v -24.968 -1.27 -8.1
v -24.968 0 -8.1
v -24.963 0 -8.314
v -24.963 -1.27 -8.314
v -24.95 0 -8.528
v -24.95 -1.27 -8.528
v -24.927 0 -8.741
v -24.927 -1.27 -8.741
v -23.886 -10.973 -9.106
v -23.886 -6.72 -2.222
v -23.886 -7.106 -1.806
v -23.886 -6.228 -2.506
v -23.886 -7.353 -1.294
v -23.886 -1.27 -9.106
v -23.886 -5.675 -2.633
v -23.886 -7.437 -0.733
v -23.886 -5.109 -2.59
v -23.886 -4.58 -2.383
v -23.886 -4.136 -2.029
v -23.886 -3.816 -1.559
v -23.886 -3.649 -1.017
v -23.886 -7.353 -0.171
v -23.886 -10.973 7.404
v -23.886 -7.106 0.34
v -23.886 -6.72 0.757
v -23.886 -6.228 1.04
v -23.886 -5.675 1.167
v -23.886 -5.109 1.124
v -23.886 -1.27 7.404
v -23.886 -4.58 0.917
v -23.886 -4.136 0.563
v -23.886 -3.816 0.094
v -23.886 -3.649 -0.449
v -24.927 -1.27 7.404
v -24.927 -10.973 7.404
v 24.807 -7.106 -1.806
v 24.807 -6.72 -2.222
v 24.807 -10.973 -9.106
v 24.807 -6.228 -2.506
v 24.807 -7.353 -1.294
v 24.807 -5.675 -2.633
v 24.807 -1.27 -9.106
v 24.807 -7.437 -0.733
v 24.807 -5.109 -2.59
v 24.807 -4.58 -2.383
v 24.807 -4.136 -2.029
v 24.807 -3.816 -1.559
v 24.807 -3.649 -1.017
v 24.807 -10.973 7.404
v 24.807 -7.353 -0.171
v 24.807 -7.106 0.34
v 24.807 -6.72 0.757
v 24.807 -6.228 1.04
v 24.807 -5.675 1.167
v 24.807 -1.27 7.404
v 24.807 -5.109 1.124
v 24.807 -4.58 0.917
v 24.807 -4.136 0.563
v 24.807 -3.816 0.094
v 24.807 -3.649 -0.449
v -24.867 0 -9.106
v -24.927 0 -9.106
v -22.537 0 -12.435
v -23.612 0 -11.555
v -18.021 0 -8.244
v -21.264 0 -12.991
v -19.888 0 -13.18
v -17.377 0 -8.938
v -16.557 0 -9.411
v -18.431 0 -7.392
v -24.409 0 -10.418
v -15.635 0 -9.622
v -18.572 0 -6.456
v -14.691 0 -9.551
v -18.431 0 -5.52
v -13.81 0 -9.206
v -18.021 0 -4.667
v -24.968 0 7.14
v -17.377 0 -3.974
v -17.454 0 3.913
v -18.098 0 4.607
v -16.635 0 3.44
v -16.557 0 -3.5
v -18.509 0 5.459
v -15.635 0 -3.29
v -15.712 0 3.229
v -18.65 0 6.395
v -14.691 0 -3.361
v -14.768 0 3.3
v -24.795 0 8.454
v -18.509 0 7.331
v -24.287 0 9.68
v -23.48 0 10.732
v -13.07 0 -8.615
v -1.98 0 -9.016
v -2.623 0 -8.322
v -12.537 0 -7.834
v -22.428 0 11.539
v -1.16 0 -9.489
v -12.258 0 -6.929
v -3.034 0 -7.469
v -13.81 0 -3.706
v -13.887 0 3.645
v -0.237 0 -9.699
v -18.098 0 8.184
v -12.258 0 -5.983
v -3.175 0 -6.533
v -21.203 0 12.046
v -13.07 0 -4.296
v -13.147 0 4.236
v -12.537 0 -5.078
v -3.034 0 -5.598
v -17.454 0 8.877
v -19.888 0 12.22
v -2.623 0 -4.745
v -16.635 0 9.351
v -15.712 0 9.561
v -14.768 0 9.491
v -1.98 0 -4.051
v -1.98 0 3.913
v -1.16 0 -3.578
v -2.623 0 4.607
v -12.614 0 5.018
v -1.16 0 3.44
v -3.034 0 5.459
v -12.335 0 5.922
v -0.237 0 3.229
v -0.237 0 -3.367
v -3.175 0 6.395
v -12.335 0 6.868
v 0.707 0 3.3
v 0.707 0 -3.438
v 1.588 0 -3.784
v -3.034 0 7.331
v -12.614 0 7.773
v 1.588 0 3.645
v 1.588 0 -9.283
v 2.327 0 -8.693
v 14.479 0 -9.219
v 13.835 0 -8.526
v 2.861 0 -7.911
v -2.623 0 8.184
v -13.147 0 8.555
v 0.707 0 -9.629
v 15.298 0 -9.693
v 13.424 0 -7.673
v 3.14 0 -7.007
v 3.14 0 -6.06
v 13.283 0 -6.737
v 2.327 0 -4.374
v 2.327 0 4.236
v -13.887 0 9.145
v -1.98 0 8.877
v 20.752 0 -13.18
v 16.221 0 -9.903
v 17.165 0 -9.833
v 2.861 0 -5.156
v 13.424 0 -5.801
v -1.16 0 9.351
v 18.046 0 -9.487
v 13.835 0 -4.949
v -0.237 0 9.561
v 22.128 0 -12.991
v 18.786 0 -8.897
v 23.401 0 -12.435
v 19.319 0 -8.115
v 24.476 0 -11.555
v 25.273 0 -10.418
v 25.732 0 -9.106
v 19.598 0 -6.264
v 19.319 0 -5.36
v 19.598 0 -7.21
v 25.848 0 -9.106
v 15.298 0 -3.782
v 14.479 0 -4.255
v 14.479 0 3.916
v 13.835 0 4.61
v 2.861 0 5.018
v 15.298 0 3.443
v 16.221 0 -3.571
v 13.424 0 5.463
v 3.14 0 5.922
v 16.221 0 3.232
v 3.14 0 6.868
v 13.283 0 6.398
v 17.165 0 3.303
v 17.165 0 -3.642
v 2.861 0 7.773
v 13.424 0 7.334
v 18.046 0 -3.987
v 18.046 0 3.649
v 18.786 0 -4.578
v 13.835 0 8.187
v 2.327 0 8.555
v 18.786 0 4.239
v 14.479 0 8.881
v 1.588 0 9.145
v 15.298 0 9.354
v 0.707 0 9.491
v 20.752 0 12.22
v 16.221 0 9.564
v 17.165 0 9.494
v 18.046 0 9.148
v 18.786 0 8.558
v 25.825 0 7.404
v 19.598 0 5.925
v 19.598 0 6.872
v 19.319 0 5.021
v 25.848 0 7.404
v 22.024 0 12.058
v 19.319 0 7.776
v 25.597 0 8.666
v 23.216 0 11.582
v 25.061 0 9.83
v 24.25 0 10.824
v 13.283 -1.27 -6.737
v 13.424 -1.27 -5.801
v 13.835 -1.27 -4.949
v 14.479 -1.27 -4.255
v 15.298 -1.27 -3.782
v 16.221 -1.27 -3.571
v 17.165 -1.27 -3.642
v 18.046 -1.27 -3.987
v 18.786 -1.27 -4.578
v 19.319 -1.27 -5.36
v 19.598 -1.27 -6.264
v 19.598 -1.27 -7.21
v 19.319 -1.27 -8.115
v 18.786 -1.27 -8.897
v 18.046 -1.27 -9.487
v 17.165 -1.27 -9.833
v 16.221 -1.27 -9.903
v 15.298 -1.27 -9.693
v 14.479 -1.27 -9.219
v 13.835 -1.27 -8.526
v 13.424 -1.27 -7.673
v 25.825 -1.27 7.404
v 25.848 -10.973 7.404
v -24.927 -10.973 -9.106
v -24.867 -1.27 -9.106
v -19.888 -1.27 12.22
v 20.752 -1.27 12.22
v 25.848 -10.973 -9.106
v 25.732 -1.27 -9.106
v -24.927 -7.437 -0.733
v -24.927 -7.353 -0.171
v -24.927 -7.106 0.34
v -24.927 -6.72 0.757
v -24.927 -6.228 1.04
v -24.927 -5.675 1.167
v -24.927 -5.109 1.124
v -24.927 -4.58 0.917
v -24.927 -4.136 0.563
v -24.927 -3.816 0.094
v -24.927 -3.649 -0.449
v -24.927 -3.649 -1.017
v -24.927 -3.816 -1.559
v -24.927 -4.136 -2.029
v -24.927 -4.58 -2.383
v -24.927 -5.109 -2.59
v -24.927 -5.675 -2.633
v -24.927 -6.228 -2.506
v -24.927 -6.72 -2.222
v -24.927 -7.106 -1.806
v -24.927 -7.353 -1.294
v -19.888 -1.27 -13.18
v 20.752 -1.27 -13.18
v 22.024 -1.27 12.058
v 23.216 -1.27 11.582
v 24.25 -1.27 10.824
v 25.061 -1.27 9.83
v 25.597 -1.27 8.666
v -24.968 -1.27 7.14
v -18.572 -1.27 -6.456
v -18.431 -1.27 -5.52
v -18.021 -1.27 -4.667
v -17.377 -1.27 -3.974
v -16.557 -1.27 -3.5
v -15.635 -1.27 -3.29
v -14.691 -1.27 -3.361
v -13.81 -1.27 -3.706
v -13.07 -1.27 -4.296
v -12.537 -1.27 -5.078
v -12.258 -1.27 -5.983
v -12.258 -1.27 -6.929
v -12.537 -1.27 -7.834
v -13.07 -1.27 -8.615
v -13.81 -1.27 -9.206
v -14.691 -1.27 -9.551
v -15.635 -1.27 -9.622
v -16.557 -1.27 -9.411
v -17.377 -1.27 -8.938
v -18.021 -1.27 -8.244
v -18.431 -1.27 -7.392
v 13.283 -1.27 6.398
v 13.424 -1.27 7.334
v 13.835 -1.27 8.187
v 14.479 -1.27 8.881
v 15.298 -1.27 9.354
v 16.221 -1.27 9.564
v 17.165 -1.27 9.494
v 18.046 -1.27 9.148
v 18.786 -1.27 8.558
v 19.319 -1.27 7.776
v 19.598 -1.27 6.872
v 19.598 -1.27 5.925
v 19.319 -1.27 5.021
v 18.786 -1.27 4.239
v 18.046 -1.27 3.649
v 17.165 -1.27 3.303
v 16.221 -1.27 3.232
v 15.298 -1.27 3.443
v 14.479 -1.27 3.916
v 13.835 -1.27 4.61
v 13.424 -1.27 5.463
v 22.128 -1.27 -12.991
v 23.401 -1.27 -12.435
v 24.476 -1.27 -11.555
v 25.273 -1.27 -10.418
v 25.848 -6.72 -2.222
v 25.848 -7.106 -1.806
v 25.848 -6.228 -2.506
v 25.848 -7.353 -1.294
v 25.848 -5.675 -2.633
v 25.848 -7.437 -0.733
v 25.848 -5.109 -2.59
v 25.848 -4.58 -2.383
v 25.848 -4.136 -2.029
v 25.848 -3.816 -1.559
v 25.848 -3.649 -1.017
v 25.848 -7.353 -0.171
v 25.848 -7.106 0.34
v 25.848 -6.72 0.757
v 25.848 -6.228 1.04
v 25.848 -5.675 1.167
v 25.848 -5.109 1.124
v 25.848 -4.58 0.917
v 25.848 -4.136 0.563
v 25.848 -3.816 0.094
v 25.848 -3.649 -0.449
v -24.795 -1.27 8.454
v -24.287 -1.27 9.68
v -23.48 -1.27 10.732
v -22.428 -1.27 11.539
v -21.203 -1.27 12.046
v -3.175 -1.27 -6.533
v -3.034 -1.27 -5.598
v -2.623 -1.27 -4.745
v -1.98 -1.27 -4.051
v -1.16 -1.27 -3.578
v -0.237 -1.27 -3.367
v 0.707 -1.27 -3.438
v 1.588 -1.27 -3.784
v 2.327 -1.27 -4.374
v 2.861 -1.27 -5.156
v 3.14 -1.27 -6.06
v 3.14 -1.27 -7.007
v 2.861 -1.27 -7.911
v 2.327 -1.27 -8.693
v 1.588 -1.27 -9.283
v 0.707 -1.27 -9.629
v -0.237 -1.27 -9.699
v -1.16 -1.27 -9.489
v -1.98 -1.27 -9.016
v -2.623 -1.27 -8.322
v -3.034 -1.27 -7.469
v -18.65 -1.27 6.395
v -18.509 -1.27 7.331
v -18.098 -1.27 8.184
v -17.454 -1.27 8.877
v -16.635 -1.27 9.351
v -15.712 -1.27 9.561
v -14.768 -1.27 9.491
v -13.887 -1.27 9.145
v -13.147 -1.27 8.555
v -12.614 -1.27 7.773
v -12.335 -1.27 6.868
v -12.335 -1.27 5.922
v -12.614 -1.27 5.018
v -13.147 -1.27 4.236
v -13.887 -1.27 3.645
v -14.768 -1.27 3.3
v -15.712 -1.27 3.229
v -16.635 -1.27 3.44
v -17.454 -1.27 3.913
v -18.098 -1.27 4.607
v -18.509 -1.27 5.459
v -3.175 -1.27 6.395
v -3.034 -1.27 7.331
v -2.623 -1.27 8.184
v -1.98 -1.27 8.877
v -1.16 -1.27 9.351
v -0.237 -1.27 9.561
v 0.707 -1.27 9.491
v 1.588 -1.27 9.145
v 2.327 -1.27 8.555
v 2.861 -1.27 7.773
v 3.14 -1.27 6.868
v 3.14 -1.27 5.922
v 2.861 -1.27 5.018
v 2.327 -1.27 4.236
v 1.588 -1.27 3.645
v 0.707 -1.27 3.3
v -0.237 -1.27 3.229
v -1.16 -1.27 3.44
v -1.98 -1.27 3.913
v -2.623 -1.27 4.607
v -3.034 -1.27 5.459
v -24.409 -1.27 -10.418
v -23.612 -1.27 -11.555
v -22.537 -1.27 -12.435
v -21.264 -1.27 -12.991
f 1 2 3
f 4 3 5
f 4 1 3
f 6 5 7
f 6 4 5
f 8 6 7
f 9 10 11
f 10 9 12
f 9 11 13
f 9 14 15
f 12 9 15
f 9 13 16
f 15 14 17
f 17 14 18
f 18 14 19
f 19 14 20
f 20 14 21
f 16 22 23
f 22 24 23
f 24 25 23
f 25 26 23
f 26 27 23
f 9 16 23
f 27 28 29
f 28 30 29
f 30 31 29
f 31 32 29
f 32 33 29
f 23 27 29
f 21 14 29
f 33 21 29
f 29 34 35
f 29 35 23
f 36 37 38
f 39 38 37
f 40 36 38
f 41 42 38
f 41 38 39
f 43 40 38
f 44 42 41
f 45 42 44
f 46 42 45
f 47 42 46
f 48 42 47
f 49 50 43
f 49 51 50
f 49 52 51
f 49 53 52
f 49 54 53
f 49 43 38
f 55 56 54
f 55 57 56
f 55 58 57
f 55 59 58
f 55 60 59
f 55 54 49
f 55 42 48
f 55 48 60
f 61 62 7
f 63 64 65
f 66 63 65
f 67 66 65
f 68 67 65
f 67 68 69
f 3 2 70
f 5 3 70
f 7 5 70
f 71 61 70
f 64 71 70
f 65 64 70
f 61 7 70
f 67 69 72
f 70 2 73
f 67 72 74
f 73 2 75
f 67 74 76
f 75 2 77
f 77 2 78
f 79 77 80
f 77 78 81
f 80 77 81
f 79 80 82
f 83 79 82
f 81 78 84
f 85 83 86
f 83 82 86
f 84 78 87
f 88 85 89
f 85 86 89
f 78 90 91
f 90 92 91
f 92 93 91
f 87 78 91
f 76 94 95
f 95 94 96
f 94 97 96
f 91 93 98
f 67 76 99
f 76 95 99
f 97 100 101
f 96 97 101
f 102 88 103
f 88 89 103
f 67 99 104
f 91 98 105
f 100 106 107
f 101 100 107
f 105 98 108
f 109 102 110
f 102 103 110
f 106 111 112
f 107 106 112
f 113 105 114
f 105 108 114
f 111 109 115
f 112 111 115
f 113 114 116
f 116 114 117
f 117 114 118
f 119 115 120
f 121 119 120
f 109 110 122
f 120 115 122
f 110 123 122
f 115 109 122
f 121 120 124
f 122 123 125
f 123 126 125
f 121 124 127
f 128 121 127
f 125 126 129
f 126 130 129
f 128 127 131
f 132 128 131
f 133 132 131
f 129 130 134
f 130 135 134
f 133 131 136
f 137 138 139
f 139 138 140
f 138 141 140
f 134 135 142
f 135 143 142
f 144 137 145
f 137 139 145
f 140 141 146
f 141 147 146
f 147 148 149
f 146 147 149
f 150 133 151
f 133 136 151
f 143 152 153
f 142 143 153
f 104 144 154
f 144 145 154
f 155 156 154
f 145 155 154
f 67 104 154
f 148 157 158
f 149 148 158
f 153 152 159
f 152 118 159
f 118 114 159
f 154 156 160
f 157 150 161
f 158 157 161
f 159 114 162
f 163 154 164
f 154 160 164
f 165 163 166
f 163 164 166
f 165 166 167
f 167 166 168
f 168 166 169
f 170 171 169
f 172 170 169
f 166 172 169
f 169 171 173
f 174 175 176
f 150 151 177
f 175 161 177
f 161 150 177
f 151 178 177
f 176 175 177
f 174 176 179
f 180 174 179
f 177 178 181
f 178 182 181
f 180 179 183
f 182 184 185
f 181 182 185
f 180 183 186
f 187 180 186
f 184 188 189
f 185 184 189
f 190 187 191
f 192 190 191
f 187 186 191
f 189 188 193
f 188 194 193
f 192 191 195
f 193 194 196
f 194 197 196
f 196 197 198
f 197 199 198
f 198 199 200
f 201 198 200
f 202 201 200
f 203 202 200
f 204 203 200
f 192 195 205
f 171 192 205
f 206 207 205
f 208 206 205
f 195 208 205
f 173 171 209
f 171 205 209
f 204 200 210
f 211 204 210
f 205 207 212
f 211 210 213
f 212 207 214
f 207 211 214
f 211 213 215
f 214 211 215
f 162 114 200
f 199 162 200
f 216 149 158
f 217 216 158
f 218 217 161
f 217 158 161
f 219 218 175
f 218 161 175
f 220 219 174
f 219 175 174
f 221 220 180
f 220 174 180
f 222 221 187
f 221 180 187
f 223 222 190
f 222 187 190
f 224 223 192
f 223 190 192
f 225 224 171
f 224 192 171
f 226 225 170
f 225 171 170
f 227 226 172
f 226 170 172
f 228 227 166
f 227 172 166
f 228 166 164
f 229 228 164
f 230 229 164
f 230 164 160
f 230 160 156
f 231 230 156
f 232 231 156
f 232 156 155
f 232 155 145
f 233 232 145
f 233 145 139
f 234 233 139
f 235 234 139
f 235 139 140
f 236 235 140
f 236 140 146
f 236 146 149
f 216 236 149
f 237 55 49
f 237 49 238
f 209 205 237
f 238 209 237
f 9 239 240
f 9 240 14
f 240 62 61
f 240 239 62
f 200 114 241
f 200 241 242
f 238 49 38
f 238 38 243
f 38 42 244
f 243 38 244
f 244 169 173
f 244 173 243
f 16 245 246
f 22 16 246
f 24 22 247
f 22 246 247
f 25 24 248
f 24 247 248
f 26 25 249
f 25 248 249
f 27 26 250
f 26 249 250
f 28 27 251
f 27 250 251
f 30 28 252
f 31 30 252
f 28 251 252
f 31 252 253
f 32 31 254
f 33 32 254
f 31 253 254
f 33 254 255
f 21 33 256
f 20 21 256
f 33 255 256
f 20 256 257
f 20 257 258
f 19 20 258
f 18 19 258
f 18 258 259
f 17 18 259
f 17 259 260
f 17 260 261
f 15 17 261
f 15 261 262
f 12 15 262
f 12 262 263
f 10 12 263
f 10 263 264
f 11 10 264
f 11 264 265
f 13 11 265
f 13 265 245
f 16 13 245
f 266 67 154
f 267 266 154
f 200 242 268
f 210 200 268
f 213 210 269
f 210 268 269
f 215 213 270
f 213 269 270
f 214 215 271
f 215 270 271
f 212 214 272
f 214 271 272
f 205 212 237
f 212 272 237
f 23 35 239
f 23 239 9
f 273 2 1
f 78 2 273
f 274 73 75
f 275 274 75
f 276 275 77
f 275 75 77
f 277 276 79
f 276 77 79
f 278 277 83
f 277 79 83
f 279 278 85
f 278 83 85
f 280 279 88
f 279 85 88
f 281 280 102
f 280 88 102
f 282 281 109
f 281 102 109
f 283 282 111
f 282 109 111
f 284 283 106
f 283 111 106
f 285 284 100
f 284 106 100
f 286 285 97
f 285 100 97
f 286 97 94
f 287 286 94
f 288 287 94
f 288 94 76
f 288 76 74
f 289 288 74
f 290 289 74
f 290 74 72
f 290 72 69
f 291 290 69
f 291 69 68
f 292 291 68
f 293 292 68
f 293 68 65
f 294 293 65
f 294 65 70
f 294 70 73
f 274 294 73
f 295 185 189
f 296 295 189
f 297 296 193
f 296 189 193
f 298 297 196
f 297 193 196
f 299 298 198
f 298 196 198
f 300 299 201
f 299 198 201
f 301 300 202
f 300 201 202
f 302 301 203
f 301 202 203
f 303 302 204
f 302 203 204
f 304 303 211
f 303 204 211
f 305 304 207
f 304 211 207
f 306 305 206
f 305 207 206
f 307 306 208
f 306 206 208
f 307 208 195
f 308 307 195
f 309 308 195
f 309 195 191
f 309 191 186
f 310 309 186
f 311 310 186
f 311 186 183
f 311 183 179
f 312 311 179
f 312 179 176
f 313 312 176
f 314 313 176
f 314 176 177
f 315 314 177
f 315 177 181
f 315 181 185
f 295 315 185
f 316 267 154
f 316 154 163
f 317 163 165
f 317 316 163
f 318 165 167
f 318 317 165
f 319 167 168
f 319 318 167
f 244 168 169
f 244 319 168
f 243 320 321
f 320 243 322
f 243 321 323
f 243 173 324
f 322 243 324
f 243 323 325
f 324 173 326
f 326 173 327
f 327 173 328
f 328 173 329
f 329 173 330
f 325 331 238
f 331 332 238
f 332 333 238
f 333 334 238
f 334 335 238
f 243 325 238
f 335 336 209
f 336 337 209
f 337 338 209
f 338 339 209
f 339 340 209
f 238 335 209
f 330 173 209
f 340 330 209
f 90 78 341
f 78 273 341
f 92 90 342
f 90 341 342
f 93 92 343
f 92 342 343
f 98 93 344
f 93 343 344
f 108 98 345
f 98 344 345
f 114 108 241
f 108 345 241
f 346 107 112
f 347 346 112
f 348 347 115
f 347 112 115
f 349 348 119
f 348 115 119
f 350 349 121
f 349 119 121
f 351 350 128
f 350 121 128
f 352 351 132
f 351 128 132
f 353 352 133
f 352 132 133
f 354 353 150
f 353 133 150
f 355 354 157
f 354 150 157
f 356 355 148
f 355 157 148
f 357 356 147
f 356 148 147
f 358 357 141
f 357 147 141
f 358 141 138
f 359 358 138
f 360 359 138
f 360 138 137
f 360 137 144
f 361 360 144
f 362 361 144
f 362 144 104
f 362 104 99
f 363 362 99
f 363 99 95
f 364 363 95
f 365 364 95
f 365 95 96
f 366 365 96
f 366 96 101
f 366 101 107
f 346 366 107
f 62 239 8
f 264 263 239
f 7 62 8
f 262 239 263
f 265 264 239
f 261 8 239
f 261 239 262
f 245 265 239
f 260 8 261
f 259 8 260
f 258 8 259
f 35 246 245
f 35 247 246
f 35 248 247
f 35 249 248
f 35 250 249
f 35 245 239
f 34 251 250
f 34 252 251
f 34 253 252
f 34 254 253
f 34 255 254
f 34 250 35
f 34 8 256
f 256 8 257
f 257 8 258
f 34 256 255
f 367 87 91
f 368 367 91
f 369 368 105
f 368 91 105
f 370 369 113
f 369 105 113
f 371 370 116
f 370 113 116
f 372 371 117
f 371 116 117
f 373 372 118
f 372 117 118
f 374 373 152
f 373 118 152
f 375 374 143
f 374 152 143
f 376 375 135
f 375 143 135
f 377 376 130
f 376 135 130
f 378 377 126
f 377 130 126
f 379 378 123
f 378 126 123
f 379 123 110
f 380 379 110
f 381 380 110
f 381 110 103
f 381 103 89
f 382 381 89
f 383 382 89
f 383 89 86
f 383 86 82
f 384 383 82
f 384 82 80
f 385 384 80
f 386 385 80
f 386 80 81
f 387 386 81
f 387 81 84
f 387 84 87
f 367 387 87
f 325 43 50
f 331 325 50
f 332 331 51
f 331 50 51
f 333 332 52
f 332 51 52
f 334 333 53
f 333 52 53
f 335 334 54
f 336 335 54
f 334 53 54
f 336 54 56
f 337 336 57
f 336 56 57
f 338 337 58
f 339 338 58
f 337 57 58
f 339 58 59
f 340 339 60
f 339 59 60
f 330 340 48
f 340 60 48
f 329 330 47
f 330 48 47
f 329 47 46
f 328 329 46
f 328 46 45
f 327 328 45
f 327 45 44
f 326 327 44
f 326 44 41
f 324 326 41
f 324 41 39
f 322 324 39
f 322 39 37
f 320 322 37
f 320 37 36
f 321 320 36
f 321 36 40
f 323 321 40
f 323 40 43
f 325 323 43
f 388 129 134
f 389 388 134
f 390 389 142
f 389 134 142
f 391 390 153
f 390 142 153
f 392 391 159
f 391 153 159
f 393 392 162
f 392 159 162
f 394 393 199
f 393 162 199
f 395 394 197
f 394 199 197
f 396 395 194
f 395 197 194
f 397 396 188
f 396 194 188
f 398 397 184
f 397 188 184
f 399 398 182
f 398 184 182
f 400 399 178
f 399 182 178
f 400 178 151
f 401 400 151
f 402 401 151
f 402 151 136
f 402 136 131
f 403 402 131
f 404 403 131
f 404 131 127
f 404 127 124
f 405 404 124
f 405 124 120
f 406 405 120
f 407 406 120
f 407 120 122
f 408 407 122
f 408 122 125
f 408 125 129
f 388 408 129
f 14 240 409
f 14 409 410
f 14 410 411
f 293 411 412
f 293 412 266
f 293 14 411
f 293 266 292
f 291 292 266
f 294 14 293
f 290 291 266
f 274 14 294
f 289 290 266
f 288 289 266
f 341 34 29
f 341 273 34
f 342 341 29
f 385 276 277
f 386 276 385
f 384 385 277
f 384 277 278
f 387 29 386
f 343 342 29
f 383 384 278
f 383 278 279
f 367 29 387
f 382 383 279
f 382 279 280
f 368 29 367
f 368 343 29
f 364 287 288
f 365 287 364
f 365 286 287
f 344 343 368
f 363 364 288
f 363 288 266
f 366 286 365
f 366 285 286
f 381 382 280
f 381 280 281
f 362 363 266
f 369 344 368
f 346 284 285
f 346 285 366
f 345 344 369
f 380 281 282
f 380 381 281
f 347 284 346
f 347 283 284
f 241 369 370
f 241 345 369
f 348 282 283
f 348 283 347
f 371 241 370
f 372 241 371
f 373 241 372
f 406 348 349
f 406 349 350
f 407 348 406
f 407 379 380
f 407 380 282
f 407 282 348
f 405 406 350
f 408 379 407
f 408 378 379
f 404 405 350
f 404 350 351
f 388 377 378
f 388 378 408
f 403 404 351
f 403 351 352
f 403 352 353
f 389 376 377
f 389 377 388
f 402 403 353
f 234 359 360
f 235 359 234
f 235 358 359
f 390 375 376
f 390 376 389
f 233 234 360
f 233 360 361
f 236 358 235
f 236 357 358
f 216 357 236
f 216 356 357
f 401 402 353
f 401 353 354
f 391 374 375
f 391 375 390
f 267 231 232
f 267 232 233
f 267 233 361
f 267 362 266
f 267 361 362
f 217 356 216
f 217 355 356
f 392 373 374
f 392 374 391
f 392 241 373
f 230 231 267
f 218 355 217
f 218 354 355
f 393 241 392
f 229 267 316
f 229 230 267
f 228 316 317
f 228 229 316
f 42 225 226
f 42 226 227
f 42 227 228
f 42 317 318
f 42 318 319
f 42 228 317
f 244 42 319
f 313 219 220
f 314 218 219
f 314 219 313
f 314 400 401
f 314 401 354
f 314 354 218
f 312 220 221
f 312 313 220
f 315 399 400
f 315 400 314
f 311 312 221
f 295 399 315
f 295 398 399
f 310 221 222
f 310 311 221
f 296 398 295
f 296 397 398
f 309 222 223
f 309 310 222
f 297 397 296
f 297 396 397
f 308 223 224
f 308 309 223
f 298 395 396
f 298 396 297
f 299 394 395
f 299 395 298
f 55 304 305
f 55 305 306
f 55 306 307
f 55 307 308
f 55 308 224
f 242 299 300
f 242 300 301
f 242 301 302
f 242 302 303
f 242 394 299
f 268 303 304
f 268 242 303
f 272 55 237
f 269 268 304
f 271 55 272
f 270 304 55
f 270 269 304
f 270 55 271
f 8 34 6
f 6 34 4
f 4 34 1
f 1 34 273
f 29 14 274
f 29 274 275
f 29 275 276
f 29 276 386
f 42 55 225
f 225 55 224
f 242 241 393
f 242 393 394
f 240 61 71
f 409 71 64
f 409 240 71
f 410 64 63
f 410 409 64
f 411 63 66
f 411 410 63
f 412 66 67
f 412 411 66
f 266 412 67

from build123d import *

# Parameters (mm, degrees)
F0_W     = 50.8
F0_H     = 25.4
F1_DEPTH = 1.27
F3_D     = 6.35
F4_R     = 5.08
F5_W     = 1.0414
F5_H     = 16.51
F6_DEPTH = 10.9728
F7_DEPTH = 0.254
F9_D     = 3.81


with BuildPart() as f1:
    # F0 (on Front) → F1 (new body)
    with BuildSketch(Plane.XZ):
        with Locations((0.432136, -0.480445)):
            Rectangle(F0_W, F0_H)
    extrude(amount=F1_DEPTH)

    # F3 (through all)
    with Locations(Plane.XZ.offset(1.27)):
        with Locations((0, -6.53336), (16.458306, 6.398361), (0, 6.395109), (16.458306, -6.737123), (-15.397238, -6.455945), (-15.474654, 6.395109)):
            Hole(F3_D / 2)

    # F4
    f4_edges = [f1.edges().sort_by_distance(p)[0] for p in [
        (25.832136, -0.635, 12.219555),
        (25.832136, -0.635, -13.180445),
        (-24.967864, -0.635, 12.219555),
        (-24.967864, -0.635, -13.180445),
    ]]
    fillet(f4_edges, radius=F4_R)

    # F5 (on Front) → F6 (join)
    with BuildSketch(Plane.XZ):
        with Locations((25.327766, -0.851475)):
            Rectangle(F5_W, F5_H)
        with Locations((-24.406663, -0.851475)):
            Rectangle(F5_W, F5_H)
    extrude(amount=F6_DEPTH)

    # F5 (on Front) → F7 (join)
    with BuildSketch(Plane.XZ):
        with Locations((25.327766, -0.851475)):
            Rectangle(F5_W, F5_H)
        with Locations((-24.406663, -0.851475)):
            Rectangle(F5_W, F5_H)
    extrude(amount=F7_DEPTH)

    # F9 (through all)
    with Locations(Plane.YZ.offset(25.848466)):
        with Locations((-5.532465, -0.73287)):
            Hole(F9_D / 2)


solid = f1.part
